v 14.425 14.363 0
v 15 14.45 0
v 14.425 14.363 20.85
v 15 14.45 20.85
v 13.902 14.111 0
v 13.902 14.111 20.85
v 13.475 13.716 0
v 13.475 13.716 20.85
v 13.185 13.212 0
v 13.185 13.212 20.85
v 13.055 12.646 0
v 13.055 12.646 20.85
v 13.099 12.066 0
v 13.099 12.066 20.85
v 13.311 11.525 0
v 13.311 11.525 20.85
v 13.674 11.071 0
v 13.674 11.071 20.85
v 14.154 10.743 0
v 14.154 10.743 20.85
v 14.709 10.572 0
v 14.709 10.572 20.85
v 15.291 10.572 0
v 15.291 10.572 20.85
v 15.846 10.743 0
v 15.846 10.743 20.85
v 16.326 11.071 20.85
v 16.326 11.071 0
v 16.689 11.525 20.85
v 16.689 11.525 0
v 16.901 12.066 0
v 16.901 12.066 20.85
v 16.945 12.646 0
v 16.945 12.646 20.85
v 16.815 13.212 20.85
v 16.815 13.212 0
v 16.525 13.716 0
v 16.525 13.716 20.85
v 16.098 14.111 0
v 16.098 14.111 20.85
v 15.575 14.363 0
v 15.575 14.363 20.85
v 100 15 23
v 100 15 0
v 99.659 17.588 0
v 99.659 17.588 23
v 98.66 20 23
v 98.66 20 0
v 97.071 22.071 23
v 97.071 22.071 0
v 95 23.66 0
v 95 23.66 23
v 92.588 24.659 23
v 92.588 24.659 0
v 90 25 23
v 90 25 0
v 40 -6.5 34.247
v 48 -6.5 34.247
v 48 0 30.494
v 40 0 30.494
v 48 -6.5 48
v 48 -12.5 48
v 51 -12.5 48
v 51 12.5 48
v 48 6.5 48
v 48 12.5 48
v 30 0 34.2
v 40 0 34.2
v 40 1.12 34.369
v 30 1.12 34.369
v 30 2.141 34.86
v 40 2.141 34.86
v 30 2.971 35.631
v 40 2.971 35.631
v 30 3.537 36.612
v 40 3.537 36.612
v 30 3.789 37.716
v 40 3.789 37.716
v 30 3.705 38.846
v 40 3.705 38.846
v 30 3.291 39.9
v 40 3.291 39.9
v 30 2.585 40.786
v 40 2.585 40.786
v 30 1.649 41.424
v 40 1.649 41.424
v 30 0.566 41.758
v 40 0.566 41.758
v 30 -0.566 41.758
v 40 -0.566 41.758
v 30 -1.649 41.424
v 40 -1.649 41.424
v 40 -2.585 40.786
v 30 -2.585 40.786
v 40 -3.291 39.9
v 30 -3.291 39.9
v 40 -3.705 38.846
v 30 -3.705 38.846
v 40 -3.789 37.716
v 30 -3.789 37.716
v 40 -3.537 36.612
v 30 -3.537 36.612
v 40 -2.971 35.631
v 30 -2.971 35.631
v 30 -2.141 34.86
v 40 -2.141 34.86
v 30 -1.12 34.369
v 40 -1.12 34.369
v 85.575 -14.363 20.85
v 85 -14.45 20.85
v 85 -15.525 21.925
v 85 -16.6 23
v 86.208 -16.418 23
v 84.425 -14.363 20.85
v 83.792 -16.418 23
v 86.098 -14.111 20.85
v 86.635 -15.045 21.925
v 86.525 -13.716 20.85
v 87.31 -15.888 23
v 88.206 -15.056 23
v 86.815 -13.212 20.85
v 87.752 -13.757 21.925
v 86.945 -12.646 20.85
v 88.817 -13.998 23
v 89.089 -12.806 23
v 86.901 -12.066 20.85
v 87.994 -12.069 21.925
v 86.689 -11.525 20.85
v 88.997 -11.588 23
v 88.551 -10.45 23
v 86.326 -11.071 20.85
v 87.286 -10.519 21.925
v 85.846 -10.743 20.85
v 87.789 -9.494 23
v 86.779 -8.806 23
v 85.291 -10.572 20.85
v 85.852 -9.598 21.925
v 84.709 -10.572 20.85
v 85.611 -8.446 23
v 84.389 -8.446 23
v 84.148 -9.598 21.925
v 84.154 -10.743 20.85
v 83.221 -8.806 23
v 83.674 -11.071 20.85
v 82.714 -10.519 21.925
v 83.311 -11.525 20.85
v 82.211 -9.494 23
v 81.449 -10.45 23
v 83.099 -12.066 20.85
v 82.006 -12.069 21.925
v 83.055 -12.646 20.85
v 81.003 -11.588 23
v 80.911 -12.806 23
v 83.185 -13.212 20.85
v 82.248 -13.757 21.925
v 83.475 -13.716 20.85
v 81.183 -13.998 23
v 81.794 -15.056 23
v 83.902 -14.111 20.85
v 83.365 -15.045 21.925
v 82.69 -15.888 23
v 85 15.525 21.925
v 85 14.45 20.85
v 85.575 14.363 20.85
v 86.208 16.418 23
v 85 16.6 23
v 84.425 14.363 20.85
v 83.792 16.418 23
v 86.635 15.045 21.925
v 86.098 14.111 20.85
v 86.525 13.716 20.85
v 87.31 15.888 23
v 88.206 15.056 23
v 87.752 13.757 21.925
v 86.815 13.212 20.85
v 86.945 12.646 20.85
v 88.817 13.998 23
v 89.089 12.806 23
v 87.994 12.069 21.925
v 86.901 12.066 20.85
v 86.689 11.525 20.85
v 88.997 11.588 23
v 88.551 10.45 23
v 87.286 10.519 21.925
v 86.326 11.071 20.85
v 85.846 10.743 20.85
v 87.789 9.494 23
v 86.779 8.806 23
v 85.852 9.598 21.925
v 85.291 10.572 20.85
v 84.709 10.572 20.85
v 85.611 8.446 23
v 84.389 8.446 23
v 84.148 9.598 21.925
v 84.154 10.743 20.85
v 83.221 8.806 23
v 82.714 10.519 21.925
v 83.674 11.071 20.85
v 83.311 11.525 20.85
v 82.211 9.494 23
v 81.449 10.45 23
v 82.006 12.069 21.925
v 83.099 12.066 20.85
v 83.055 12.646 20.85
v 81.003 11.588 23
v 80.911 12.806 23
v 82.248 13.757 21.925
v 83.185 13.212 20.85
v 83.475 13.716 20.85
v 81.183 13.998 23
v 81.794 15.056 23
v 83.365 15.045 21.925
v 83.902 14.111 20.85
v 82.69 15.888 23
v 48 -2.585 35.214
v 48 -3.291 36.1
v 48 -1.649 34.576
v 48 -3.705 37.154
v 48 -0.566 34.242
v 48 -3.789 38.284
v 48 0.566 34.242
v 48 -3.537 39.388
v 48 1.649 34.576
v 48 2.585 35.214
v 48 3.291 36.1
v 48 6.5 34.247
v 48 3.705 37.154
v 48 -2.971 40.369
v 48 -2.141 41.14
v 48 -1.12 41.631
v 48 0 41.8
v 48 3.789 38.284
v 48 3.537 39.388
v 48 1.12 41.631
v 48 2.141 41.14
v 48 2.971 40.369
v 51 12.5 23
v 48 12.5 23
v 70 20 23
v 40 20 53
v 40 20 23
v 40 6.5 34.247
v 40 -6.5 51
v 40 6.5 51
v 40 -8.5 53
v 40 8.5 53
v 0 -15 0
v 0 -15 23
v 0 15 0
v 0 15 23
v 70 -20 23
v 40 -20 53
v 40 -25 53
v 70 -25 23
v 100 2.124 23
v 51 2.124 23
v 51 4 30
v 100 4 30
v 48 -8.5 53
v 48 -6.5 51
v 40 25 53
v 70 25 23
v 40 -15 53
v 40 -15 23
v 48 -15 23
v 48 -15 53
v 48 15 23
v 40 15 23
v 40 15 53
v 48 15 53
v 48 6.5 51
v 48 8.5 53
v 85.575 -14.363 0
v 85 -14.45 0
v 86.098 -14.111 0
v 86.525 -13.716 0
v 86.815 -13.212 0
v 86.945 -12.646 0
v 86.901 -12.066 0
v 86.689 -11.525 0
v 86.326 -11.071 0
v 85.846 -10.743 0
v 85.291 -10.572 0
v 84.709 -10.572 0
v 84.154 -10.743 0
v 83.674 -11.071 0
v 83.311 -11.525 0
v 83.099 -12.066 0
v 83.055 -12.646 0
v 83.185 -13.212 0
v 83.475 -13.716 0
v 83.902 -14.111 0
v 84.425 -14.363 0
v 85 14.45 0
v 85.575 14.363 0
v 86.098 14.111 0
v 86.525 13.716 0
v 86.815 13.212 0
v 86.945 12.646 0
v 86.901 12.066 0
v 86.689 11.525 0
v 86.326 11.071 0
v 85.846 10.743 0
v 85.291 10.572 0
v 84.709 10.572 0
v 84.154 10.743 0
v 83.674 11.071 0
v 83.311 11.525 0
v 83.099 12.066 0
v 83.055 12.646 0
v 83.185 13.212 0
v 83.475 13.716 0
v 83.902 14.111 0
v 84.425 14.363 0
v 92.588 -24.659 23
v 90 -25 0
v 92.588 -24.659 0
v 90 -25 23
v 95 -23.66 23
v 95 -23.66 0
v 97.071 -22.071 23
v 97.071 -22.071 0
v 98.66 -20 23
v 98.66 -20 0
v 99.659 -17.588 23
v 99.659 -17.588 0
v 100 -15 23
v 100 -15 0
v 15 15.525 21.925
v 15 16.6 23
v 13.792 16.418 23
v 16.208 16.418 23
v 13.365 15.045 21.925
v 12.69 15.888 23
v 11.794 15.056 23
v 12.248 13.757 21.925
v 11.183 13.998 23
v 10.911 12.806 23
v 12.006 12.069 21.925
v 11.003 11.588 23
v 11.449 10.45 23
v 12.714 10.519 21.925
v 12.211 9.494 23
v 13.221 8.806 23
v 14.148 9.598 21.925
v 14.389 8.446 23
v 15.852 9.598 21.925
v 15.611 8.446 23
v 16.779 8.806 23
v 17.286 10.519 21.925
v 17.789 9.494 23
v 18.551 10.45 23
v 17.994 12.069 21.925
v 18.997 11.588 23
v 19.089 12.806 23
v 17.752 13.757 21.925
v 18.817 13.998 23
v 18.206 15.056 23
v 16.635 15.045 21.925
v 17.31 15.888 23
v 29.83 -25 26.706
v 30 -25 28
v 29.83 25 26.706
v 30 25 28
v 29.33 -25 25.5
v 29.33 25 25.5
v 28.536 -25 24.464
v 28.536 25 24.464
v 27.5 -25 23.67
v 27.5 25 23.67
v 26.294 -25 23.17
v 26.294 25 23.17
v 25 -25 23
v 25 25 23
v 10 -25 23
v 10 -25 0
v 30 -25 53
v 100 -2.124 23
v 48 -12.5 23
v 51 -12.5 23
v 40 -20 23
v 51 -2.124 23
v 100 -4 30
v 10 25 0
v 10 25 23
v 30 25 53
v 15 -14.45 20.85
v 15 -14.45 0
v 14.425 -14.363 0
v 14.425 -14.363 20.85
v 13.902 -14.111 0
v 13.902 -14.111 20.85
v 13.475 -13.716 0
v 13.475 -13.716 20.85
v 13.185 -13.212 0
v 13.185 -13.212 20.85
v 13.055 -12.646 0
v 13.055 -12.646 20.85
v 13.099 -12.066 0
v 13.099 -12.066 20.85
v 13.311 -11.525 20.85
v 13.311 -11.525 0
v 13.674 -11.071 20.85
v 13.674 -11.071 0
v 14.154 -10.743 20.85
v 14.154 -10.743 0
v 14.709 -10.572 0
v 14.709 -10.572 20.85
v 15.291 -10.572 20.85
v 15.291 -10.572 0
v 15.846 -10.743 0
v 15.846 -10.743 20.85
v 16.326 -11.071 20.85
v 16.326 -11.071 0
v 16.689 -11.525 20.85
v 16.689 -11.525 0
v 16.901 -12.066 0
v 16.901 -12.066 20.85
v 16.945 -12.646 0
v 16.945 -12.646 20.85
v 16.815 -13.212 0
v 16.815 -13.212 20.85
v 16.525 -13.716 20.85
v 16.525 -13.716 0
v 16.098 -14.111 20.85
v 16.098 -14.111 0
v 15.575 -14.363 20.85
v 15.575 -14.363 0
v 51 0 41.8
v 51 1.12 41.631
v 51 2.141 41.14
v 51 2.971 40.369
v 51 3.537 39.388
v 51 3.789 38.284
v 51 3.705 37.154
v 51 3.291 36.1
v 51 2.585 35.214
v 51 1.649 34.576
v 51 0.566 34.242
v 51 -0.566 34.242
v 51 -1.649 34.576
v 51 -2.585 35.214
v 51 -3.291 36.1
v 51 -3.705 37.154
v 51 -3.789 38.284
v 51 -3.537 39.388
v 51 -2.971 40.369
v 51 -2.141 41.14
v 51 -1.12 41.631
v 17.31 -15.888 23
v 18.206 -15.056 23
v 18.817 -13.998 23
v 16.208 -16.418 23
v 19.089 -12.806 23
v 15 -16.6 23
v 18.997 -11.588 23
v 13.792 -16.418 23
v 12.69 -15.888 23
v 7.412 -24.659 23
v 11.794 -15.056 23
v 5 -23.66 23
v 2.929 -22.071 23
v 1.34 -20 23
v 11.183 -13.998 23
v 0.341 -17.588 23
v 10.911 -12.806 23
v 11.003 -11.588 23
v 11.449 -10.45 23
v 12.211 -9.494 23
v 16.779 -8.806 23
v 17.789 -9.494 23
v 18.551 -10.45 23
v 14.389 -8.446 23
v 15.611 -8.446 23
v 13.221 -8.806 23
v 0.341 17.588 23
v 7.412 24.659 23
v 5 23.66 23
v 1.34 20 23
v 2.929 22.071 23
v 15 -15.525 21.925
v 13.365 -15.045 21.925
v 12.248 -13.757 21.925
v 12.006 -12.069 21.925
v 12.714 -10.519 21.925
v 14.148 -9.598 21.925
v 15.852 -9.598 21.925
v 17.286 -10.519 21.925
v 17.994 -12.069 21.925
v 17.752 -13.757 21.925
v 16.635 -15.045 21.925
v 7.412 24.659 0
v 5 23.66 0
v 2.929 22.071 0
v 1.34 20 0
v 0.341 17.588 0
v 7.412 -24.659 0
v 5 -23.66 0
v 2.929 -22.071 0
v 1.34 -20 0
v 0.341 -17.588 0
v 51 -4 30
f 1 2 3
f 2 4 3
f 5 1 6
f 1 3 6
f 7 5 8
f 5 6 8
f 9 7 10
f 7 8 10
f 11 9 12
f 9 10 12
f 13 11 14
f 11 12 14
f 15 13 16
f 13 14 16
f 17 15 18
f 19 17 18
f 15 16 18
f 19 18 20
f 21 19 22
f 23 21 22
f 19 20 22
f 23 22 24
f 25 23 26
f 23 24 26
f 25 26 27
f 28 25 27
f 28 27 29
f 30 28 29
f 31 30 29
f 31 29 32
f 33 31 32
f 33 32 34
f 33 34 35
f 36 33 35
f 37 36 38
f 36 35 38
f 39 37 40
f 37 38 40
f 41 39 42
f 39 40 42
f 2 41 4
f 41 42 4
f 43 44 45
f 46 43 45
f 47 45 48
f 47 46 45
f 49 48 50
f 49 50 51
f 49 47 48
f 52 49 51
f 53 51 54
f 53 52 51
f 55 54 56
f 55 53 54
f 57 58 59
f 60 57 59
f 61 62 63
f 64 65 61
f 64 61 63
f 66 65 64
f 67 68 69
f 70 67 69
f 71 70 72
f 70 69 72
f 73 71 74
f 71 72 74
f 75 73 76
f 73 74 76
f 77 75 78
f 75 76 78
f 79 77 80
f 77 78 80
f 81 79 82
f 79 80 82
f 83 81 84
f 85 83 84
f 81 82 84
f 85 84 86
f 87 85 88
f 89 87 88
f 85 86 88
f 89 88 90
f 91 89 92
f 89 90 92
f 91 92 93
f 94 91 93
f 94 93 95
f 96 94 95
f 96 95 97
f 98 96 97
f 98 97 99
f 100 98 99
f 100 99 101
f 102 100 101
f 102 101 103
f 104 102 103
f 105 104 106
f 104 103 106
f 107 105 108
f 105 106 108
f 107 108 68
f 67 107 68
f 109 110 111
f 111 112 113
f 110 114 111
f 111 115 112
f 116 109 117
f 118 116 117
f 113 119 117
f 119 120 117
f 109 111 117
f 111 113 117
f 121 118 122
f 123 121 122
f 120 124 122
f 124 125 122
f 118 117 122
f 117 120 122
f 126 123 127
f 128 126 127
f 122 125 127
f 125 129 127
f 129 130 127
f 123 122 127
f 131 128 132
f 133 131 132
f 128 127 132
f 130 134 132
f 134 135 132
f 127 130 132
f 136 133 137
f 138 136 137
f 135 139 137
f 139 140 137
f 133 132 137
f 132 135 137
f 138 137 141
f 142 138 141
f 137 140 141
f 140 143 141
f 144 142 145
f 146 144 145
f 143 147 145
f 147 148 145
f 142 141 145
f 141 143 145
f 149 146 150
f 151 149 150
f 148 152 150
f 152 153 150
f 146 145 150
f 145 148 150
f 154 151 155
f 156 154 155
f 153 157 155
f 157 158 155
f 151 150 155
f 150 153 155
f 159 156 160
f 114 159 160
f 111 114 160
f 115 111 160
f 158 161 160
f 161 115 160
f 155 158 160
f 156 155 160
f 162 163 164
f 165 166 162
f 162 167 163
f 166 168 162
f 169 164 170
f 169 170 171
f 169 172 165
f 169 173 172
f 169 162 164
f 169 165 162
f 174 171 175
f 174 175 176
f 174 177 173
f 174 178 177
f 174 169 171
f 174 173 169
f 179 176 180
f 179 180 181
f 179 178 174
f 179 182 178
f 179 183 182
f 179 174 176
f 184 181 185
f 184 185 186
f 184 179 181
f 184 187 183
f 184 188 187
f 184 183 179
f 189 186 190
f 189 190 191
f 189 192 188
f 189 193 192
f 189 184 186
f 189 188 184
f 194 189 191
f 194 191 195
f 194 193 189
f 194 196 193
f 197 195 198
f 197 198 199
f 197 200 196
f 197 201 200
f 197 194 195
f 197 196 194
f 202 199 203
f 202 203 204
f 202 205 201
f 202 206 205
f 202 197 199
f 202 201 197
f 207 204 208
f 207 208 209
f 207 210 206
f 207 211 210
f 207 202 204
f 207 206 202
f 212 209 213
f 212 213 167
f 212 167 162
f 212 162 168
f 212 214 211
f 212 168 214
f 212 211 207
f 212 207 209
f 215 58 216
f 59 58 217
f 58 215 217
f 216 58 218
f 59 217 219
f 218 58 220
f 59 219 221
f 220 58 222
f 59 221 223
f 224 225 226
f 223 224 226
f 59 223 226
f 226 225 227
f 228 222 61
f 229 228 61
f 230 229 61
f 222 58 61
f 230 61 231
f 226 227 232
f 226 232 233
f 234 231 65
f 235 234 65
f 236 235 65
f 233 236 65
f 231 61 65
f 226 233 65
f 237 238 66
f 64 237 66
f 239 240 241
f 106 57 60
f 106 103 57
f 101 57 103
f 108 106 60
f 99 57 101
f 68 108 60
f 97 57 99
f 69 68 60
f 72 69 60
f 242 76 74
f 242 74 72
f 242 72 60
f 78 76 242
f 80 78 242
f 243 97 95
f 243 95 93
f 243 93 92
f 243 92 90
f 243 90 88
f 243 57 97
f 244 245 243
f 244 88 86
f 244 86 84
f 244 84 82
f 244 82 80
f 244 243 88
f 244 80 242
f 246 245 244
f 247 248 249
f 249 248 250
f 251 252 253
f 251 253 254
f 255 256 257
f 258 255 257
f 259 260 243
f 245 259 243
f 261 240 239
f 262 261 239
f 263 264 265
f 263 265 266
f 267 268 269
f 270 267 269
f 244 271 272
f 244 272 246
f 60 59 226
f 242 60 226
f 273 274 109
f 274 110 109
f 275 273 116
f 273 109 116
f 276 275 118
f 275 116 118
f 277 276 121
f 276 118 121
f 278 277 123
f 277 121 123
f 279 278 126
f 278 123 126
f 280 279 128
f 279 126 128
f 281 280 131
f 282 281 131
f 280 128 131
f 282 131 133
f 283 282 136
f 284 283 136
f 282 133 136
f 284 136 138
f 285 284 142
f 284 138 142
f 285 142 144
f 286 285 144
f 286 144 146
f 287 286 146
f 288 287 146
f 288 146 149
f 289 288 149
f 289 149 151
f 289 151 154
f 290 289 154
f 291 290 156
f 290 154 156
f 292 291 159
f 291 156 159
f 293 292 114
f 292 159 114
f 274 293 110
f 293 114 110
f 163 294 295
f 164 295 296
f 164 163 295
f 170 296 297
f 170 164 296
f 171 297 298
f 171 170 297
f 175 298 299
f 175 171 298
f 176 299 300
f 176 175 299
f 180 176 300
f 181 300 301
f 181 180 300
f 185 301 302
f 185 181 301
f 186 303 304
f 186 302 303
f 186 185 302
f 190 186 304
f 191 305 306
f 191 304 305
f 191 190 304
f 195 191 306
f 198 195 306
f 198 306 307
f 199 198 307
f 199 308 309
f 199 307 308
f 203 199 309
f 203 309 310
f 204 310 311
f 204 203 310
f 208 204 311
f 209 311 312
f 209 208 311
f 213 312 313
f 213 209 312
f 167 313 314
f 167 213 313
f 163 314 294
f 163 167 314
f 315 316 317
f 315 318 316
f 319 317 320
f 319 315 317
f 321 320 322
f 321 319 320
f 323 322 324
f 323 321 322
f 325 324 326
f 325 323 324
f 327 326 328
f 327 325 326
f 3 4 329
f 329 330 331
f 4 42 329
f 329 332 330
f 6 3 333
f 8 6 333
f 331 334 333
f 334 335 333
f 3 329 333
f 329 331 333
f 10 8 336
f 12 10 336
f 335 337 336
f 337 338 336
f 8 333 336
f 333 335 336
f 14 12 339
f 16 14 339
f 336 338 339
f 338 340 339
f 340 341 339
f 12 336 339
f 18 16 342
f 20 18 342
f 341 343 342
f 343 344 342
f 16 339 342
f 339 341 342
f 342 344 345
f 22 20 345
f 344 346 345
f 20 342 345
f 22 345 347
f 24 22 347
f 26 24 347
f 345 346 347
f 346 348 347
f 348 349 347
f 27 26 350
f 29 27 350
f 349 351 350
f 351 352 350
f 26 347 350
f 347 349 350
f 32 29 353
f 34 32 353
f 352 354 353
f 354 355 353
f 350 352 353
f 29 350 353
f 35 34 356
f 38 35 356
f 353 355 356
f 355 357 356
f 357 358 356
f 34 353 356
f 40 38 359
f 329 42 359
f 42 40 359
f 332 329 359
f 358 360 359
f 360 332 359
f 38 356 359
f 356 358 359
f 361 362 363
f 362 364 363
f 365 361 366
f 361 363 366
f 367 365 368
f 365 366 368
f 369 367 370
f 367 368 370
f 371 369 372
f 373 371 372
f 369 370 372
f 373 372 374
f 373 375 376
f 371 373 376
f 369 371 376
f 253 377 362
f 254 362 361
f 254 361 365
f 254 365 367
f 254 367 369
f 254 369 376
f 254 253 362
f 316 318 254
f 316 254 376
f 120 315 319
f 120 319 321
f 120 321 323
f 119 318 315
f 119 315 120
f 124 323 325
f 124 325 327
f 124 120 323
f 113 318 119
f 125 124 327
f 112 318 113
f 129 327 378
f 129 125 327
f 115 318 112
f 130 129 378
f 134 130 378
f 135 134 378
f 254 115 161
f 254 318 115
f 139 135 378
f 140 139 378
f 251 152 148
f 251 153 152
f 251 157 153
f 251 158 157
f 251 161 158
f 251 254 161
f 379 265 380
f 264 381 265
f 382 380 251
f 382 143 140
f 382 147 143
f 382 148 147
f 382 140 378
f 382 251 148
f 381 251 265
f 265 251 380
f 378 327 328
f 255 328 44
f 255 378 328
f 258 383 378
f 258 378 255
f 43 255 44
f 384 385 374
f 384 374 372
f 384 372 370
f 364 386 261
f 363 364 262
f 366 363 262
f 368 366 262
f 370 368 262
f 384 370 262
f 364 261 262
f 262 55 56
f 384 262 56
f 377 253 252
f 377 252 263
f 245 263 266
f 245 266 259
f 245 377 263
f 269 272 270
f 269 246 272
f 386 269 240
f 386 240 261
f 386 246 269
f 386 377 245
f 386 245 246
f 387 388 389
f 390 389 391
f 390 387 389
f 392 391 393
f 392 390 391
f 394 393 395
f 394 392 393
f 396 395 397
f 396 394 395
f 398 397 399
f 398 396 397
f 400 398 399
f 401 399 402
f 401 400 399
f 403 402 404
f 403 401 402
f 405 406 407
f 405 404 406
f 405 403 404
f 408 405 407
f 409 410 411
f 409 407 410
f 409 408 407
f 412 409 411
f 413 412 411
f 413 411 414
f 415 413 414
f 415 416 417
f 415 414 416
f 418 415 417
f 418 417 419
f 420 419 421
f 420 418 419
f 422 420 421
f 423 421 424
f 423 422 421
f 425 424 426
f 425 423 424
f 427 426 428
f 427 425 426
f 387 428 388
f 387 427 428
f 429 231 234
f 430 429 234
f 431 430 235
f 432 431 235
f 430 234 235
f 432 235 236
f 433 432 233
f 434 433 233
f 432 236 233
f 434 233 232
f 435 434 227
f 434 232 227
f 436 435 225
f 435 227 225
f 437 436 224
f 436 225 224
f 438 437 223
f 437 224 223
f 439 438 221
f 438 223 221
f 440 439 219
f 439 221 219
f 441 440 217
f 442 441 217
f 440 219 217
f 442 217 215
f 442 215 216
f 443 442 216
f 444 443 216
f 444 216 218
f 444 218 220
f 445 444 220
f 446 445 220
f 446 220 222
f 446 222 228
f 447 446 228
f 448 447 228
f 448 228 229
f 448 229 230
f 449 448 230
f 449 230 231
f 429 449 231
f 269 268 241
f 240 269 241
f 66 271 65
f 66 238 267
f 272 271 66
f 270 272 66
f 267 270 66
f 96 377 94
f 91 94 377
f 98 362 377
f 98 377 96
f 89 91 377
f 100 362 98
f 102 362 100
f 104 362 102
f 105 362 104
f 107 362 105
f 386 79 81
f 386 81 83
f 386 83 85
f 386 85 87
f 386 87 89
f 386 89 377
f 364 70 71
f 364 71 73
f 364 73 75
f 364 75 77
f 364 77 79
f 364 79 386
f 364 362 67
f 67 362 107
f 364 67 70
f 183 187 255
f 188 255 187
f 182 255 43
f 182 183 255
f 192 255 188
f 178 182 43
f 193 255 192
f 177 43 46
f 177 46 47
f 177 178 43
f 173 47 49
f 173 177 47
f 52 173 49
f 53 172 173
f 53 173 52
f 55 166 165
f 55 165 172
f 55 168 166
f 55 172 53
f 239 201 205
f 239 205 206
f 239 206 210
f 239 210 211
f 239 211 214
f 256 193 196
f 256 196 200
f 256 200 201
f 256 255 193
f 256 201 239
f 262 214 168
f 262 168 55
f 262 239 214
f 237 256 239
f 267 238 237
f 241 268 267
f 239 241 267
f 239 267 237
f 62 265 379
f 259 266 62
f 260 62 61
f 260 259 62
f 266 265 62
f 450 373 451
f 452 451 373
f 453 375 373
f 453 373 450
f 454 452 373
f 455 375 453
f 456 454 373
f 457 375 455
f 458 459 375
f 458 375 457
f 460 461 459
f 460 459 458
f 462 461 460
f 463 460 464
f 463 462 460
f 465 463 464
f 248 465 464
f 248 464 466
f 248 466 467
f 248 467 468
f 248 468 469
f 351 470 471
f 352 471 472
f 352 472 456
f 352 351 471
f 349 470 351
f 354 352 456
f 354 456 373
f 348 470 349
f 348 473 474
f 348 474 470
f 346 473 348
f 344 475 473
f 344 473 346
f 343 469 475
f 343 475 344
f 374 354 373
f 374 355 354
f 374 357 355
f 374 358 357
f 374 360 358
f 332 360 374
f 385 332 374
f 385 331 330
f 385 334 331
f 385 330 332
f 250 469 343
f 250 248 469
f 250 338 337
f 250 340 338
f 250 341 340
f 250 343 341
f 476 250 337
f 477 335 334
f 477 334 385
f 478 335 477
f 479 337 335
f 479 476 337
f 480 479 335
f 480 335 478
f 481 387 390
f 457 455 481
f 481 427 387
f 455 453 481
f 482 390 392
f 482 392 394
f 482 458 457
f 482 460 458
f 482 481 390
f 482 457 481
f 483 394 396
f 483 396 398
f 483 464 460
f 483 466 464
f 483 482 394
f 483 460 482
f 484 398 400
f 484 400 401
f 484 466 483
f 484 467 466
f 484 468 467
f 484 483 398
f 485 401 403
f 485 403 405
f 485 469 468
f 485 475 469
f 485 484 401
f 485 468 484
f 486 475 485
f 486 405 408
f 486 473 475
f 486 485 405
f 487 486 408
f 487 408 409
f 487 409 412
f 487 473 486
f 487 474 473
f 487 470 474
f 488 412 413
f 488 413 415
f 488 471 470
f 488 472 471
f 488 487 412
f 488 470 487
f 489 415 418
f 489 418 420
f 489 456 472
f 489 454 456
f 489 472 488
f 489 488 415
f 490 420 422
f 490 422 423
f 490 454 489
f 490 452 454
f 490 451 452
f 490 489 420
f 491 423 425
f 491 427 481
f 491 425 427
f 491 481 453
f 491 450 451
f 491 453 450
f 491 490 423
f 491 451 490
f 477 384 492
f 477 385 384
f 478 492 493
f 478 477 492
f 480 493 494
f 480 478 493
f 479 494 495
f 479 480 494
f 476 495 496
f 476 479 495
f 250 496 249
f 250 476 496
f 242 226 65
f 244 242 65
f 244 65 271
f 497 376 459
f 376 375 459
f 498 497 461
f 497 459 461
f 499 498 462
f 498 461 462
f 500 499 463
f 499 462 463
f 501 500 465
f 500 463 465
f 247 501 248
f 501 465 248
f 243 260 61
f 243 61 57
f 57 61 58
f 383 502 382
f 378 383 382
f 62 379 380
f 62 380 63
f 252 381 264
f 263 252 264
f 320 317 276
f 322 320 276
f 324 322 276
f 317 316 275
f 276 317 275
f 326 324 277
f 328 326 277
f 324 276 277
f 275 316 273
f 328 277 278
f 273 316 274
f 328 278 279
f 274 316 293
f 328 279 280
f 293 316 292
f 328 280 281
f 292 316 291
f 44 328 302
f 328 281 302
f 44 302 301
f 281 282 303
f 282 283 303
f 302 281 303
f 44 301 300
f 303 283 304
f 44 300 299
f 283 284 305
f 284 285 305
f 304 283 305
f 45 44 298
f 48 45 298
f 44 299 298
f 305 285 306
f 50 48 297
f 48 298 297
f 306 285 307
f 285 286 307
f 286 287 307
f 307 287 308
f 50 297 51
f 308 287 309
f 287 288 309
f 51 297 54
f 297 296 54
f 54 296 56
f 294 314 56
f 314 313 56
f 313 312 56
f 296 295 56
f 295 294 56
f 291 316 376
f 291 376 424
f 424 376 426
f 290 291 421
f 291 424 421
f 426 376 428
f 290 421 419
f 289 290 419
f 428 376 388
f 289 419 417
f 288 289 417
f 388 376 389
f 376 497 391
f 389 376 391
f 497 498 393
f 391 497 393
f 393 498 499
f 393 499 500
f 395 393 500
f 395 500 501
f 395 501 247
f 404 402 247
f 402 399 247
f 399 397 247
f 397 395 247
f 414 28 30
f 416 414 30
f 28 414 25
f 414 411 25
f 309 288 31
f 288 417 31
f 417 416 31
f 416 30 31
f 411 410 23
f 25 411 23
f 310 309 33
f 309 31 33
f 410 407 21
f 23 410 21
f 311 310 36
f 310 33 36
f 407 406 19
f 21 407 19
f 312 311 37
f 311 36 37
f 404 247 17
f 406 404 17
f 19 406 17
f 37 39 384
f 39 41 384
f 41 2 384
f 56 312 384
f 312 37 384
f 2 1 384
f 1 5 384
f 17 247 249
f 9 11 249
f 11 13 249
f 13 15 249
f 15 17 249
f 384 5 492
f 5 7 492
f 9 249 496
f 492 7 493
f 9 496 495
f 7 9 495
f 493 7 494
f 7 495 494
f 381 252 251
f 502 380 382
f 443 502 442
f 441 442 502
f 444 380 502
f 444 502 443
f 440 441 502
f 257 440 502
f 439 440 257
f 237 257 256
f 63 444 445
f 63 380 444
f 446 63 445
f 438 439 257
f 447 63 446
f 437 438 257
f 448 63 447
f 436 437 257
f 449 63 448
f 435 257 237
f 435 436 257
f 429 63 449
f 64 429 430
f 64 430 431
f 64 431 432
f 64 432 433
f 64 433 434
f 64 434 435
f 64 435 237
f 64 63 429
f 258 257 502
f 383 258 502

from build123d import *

# Parameters (mm, degrees)
SCHIZZO1_W                   = 50
SCHIZZO1_H                   = 23
ESTRUSIONE_ESTRUSIONE1_DEPTH = 100
SCHIZZO2_W                   = 10
SCHIZZO2_H                   = 50
ESTRUSIONE_ESTRUSIONE2_DEPTH = 30
M7_CLEARANCE_HOLE1_D         = 7.6
ESTRUSIONE_ESTRUSIONE3_DEPTH = 60
NERVATURA2_REACH             = 125.73
SCHIZZO10_WALL_W             = 291.885494398
SCHIZZO10_WALL_H             = 5
SCHIZZO11_W                  = 30
SCHIZZO11_H                  = 30
ESTRUSIONE_ESTRUSIONE4_DEPTH = 8
TAGLIO_ESTRUSIONE1_DEPTH     = 8
RACCORDO1_R                  = 10
SMUSSO2_SIZE                 = 2
RACCORDO2_R                  = 5
SCHIZZO17_W                  = 25
SCHIZZO17_H                  = 25
ESTRUSIONE_ESTRUSIONE8_DEPTH = 3
M7_CLEARANCE_HOLE2_D         = 7.6


with BuildPart() as part:
    # Schizzo1 → Estrusione-Estrusione1 (new body)
    with BuildSketch(Plane.YZ):
        with Locations((0, 11.5)):
            Rectangle(SCHIZZO1_W, SCHIZZO1_H)
    extrude(amount=ESTRUSIONE_ESTRUSIONE1_DEPTH)

    # Schizzo2 → Estrusione-Estrusione2 (add)
    with BuildSketch(Plane.XY.offset(23)):
        with Locations((35, 0)):
            Rectangle(SCHIZZO2_W, SCHIZZO2_H)
    extrude(amount=ESTRUSIONE_ESTRUSIONE2_DEPTH)

    # M7 Clearance Hole1 (through all)
    with Locations(Plane.ZY.offset(-30)):
        with Locations((38, 0)):
            Hole(M7_CLEARANCE_HOLE1_D / 2)

    # Schizzo5 → Estrusione-Estrusione3 (add)
    with BuildSketch(Plane.YZ.offset(40)):
        Polygon((-2.124355653, 23), (2.124355653, 23), (4, 30), (-4, 30), align=None)
    extrude(amount=ESTRUSIONE_ESTRUSIONE3_DEPTH)

    # Schizzo10 wall → Nervatura2 (add, up to next)
    with BuildSketch(Plane(origin=(55, -25, 38), x_dir=(0.707106781187, 0, -0.707106781187), z_dir=(0.707106781187, 0, 0.707106781187)), mode=Mode.PRIVATE) as nervatura2_sk1:
        with Locations((0, 2.5)):
            Rectangle(SCHIZZO10_WALL_W, SCHIZZO10_WALL_H)
    nervatura2_tool1 = extrude(nervatura2_sk1.sketch, amount=-NERVATURA2_REACH, mode=Mode.PRIVATE) - part.part
    nervatura2 = nervatura2_tool1.solids().sort_by_distance((55, -25, 38))[0]
    add(nervatura2)

    # Specchia2: Nervatura2 across plane
    add(nervatura2.mirror(Plane.ZX))

    # Schizzo11 → Estrusione-Estrusione4 (add)
    with BuildSketch(Plane.YZ.offset(40)):
        with Locations((0, 38)):
            Rectangle(SCHIZZO11_W, SCHIZZO11_H)
    extrude(amount=ESTRUSIONE_ESTRUSIONE4_DEPTH)

    # Schizzo13 → Taglio-Estrusione1 (cut)
    with BuildSketch(Plane.YZ.offset(48)):
        Polygon((-6.5, 41.75277675), (-6.5, 34.24722325), (0, 30.494446501), (6.5, 34.24722325), (6.5, 41.75277675), (6.5, 53), (-6.5, 53), align=None)
    extrude(amount=-TAGLIO_ESTRUSIONE1_DEPTH, mode=Mode.SUBTRACT)

    # Schizzo16 → CSK for M3.5 Oval Head Machine Screw1 (revolve, cut)
    with BuildSketch(Plane(origin=(15, -12.5, 23), x_dir=(0, -1, 0), z_dir=(1, 0, 0))):
        Polygon((0, 0), (0, 31.171678207), (1.95, 30), (1.95, 2.15), (4.1, 0), align=None)
    csk_for_m3_5_oval_head_machine_screw1 = revolve(axis=Axis((15, -12.5, 29.35), (0, 0, -1)), mode=Mode.SUBTRACT)

    # Specchia3: CSK for M3.5 Oval Head Machine Screw1 across plane
    add(csk_for_m3_5_oval_head_machine_screw1.mirror(Plane.ZY.offset(-50)), mode=Mode.SUBTRACT)

    # Specchia3 at the second plane: CSK for M3.5 Oval Head Machine Screw1 across plane
    add(csk_for_m3_5_oval_head_machine_screw1.mirror(Plane.ZX), mode=Mode.SUBTRACT)

    # Specchia3 at the second plane copy 1 ske → Specchia3 at the second plane copy 1 (revolve, cut)
    with BuildSketch(Plane(origin=(85, 12.5, 23), x_dir=(0, 1, 0), z_dir=(-1, 0, 0))):
        Polygon((0, 0), (0, 31.171678207), (1.95, 30), (1.95, 2.15), (4.1, 0), align=None)
    revolve(axis=Axis((85, 12.5, 29.35), (0, 0, -1)), mode=Mode.SUBTRACT)

    # Raccordo1
    raccordo1_edges = [part.edges().sort_by_distance(p)[0] for p in [
        (100, 25, 11.5),
        (100, -25, 11.5),
        (0, 25, 11.5),
        (0, -25, 11.5),
    ]]
    fillet(raccordo1_edges, radius=RACCORDO1_R)

    # Smusso2
    smusso2_edges = [part.edges().sort_by_distance(p)[0] for p in [
        (44, 6.5, 53),
        (44, -6.5, 53),
    ]]
    chamfer(smusso2_edges, length=SMUSSO2_SIZE)

    # Raccordo2
    raccordo2_edges = [part.edges().sort_by_distance(p)[0] for p in [
        (30, 0, 23),
    ]]
    fillet(raccordo2_edges, radius=RACCORDO2_R)

    # Schizzo17 → Estrusione-Estrusione8 (add)
    with BuildSketch(Plane.YZ.offset(48)):
        with Locations((0, 35.5)):
            Rectangle(SCHIZZO17_W, SCHIZZO17_H)
    extrude(amount=ESTRUSIONE_ESTRUSIONE8_DEPTH)

    # M7 Clearance Hole2 (through all)
    with Locations(Plane(origin=(51, 0, 0), x_dir=(0, 0, -1), z_dir=(1, 0, 0))):
        with Locations((-38, 0)):
            Hole(M7_CLEARANCE_HOLE2_D / 2)


solid = part.part
